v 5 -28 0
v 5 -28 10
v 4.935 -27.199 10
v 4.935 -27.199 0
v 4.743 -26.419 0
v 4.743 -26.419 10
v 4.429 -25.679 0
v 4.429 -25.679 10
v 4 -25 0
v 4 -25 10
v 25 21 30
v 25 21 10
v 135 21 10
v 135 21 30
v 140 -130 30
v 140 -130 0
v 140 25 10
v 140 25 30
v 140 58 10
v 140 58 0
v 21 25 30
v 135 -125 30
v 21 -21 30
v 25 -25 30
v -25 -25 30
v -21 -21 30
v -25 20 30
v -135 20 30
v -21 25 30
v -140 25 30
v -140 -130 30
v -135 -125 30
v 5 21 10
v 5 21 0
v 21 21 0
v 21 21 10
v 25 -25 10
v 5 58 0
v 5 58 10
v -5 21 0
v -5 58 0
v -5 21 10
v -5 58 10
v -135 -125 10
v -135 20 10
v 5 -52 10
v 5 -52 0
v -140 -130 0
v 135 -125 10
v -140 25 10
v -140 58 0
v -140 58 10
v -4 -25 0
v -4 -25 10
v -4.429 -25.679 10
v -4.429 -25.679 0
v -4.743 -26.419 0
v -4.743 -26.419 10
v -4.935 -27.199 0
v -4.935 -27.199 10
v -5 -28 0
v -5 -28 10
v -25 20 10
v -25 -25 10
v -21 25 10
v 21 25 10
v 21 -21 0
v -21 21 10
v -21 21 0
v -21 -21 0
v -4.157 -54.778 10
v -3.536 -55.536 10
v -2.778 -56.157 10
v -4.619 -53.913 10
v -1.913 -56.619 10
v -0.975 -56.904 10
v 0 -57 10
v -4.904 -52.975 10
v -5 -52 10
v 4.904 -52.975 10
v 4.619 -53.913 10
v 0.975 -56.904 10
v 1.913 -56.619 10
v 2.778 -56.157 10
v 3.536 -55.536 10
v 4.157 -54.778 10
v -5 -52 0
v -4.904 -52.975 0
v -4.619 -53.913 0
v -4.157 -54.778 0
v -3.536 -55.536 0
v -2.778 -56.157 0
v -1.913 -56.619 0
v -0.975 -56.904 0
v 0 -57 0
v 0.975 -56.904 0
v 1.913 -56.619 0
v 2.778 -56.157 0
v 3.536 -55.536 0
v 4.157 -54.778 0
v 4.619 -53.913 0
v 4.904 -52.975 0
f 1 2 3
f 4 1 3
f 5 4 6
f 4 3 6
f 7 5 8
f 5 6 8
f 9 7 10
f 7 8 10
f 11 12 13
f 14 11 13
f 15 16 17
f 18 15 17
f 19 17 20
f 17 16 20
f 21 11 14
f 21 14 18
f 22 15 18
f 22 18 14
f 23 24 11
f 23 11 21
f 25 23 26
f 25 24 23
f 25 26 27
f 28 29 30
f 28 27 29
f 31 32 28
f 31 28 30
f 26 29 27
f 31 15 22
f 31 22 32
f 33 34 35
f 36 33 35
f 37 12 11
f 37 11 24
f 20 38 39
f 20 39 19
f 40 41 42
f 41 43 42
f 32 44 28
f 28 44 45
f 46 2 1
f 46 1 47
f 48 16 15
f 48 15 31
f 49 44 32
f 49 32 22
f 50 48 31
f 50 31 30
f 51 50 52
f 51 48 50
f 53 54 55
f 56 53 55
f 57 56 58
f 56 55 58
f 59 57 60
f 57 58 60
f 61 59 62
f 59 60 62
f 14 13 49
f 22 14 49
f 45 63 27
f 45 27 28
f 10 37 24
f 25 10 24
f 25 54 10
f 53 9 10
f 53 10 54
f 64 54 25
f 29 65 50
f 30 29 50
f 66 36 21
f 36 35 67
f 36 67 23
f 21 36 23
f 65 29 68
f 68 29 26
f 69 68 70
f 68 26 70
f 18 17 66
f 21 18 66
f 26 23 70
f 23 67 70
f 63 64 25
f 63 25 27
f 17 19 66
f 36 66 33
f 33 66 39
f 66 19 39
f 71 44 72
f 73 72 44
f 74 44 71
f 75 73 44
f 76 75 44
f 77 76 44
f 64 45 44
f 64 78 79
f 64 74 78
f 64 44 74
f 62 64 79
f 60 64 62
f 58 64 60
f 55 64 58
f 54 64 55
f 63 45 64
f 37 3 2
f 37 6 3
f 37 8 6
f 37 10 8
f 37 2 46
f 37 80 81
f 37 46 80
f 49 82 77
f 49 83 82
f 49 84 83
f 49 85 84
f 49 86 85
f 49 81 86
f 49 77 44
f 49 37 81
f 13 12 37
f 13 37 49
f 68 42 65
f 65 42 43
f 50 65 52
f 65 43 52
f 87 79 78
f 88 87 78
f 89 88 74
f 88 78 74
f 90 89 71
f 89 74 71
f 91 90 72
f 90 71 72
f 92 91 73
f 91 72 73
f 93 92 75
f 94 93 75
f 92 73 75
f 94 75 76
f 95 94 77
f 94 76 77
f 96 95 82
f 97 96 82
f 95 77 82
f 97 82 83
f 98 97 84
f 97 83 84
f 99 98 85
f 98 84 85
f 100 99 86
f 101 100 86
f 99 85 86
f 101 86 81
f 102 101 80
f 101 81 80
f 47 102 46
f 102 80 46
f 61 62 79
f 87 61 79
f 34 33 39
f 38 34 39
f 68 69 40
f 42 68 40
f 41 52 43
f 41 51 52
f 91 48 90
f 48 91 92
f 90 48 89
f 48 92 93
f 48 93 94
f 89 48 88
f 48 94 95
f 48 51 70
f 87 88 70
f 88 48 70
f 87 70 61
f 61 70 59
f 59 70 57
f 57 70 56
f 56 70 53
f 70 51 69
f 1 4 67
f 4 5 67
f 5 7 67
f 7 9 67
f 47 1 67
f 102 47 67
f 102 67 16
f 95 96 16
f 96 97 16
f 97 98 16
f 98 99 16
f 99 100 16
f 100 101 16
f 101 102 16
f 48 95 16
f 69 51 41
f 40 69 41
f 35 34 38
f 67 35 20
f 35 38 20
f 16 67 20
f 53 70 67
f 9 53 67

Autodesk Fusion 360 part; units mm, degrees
sketch "Sketch1" plane through (0, 0, 0) normal (0, 0, 1) x (1, 0, 0)
  line L0 (21, -21) -> (-21, -21)
  line L1 (-21, -21) -> (-21, 21)
  line L2 (-21, 21) -> (21, 21)
  line L3 (21, 21) -> (21, -21)
  line L4 (21, -21) -> (-21, 21) construction
  line L5 (-21, -21) -> (21, 21) construction
  line L6 (0, 50) -> (0, -40)
  line L7 (-140, 50) -> (140, 50)
  line L8 (140, 50) -> (140, -130)
  line L9 (140, -130) -> (-140, -130)
  line L10 (-140, -130) -> (-140, 50)
  line L11 (-140, 50) -> (140, -130) construction
  line L12 (140, 50) -> (-140, -130) construction
  point P0 (0, -40)
  dimension "d1" = 42
  dimension "d2" = 42
  dimension "d14" = 280
extrude "Extrude4" add sketch "Sketch1" along normal blind 10
sketch "Sketch3" plane through (0, 0, 10) normal (0, 0, 1) x (-1, 0, 0)
  line L0 (21, -21) -> (-21, -21)
  line L1 (-21, -21) -> (-21, 21)
  line L2 (-21, 21) -> (21, 21)
  line L3 (21, 21) -> (21, -21)
  line L4 (140, 130) -> (-140, 130)
  line L5 (-140, 130) -> (-140, -50)
  line L6 (-140, -50) -> (140, -50)
  line L7 (140, -50) -> (140, 130)
  line L8 (-120, 120) -> (40, 120)
  line L9 (40, 120) -> (40, 35)
  line L10 (40, 35) -> (-120, 35)
  line L11 (-120, 35) -> (-120, 120)
  line L12 (70, 100) -> (126, 100)
  line L13 (126, 100) -> (126, 15)
  line L14 (126, 15) -> (70, 15)
  line L15 (70, 15) -> (70, 100)
  line L16 (-140, -50) -> (-135, -50)
  line L17 (-135, -50) -> (-135, 130)
  line L18 (-135, 130) -> (-140, 130)
  line L19 (-140, 130) -> (-140, -50)
  line L20 (-135, 130) -> (140, 130)
  line L21 (140, 130) -> (140, 125)
  line L22 (140, 125) -> (-135, 125)
  line L23 (-135, 125) -> (-135, 130)
  line L24 (140, 125) -> (135, 125)
  line L25 (135, 125) -> (135, -25)
  line L26 (135, -25) -> (140, -25)
  line L27 (140, -25) -> (140, 125)
  line L28 (135, -25) -> (25, -25)
  line L29 (25, -25) -> (25, -20)
  line L30 (25, -20) -> (135, -20)
  line L31 (135, -20) -> (135, -25)
  line L32 (25, -25) -> (-25, -25)
  line L33 (-25, -25) -> (-25, 25)
  line L34 (-25, 25) -> (25, 25)
  line L35 (25, 25) -> (25, -25)
  line L36 (25, -25) -> (-25, 25) construction
  line L37 (-25, -25) -> (25, 25) construction
  line L38 (-25, -25) -> (-135, -25)
  line L39 (-25, -21) -> (-135, -21)
  dimension "d17" = 160
  dimension "d18" = 85
  dimension "d19" = 56
  dimension "d20" = 85
  dimension "d24" = 5
  dimension "d25" = 5
  dimension "d26" = 5
  dimension "d29" = 50
  dimension "d30" = 50
extrude "Extrude6" add sketch "Sketch3" along normal blind 10 contours L4 L7 L17 L20 L21 L22 L23 L24 | L4 L5 L6 L16 L17 L18 L19 L23 | L7 L22 L24 L25 L26 L27 L31 | L25 L28 L29 L30 L31 L35
extrude "Extrude7" add sketch "Sketch3" along normal blind 10 contours L29 L32 L33 L34 L35
extrude "Extrude8" add sketch "Sketch3" along normal blind 10 contours L17 L33 L38 L39
sketch "Sketch4" plane through (0, 50, 0) normal (0, 1, 0) x (-1, 0, 0)
  line L0 (-140, 0) -> (140, 0)
  line L1 (140, 0) -> (140, 10)
  line L2 (140, 10) -> (-135, 10)
  line L3 (-135, 10) -> (-135, 20)
  line L4 (-135, 20) -> (-140, 20)
  line L5 (-140, 20) -> (-140, 0)
  line L6 (-140, 10) -> (-135, 10)
extrude "Extrude9" cut sketch "Sketch4" against normal blind 25 contours L3 L4 L5 L6
extrude "Extrude10" add 1 faces at (45, -128.3333, 20) along direction (0, 0, 1) blind 10
sketch "Sketch6" plane through (0, 0, 10) normal (0, 0, 1) x (-1, 0, 0)
  line L0 (-135, -21) -> (-25, -21)
  line L1 (-25, -21) -> (-25, 25)
  line L2 (-25, 25) -> (25, 25)
  line L3 (25, 25) -> (25, -20)
  line L4 (25, -20) -> (135, -20)
  line L5 (135, -20) -> (135, 125)
  line L6 (135, 125) -> (-135, 125)
  line L7 (-135, 125) -> (-135, -21)
  line L8 (0, 21) -> (0, 28)
  line L9 (0, 28) -> (0, 52)
  circle A0 centre (0, 28) radius 5
  circle A1 centre (0, 28) radius 7
  circle A2 centre (0, 52) radius 5
  circle A3 centre (0, 52) radius 7
  line L10 (7, 28) -> (7, 52)
  line L11 (-7, 28) -> (-7, 51)
  line L12 (5, 28) -> (5, 52)
  line L13 (-5, 28) -> (-5, 52)
  line L14 (-5, -50) -> (5, -50)
  line L15 (5, -50) -> (5, -25)
  line L16 (5, -25) -> (-5, -25)
  line L17 (-5, -25) -> (-5, -50)
  dimension "d39" = 7
  dimension "d40" = 10
  dimension "d41" = 10
  dimension "d42" = 14
extrude "Extrude11" cut sketch "Sketch6" against normal blind 20 contours L2 L8 L9 A0 | L2 L8 L9 A0 | L9 A0 A1 L13 | L9 A1 A3 L13 | L9 A0 A1 L12 | L9 A1 A3 L12 | L9 A2 A3 L13 | L9 A2 A3 L12 | A2
extrude "Extrude12" cut sketch "Sketch6" against normal blind 20 contours L14 L15 L16 L17
sketch "Sketch7" plane through (0, 21, 0) normal (0, -1, 0) x (1, 0, 0)
  line L0 (-21, 0) -> (21, 0)
  line L1 (21, 0) -> (21, 30)
  line L2 (21, 30) -> (-21, 30)
  line L3 (-21, 30) -> (-21, 0)
  line L4 (-21, 30) -> (21, 30)
  line L5 (21, 30) -> (21, 10)
  line L6 (21, 10) -> (-21, 10)
  line L7 (-21, 10) -> (-21, 30)
  dimension "d47" = 20
extrude "Extrude13" cut sketch "Sketch7" against normal blind 10 contours L1 L2 L3 L4 L5 L6 L7
extrude "Extrude14" cut 1 faces at (1.6667, 25, 3.3333) along direction (0, -1, 0) blind 5
extrude "Extrude15" add 2 faces at (50, 50, 3.3333) (-50, 50, 6.6667) along direction (0, 1, 0) blind 8
